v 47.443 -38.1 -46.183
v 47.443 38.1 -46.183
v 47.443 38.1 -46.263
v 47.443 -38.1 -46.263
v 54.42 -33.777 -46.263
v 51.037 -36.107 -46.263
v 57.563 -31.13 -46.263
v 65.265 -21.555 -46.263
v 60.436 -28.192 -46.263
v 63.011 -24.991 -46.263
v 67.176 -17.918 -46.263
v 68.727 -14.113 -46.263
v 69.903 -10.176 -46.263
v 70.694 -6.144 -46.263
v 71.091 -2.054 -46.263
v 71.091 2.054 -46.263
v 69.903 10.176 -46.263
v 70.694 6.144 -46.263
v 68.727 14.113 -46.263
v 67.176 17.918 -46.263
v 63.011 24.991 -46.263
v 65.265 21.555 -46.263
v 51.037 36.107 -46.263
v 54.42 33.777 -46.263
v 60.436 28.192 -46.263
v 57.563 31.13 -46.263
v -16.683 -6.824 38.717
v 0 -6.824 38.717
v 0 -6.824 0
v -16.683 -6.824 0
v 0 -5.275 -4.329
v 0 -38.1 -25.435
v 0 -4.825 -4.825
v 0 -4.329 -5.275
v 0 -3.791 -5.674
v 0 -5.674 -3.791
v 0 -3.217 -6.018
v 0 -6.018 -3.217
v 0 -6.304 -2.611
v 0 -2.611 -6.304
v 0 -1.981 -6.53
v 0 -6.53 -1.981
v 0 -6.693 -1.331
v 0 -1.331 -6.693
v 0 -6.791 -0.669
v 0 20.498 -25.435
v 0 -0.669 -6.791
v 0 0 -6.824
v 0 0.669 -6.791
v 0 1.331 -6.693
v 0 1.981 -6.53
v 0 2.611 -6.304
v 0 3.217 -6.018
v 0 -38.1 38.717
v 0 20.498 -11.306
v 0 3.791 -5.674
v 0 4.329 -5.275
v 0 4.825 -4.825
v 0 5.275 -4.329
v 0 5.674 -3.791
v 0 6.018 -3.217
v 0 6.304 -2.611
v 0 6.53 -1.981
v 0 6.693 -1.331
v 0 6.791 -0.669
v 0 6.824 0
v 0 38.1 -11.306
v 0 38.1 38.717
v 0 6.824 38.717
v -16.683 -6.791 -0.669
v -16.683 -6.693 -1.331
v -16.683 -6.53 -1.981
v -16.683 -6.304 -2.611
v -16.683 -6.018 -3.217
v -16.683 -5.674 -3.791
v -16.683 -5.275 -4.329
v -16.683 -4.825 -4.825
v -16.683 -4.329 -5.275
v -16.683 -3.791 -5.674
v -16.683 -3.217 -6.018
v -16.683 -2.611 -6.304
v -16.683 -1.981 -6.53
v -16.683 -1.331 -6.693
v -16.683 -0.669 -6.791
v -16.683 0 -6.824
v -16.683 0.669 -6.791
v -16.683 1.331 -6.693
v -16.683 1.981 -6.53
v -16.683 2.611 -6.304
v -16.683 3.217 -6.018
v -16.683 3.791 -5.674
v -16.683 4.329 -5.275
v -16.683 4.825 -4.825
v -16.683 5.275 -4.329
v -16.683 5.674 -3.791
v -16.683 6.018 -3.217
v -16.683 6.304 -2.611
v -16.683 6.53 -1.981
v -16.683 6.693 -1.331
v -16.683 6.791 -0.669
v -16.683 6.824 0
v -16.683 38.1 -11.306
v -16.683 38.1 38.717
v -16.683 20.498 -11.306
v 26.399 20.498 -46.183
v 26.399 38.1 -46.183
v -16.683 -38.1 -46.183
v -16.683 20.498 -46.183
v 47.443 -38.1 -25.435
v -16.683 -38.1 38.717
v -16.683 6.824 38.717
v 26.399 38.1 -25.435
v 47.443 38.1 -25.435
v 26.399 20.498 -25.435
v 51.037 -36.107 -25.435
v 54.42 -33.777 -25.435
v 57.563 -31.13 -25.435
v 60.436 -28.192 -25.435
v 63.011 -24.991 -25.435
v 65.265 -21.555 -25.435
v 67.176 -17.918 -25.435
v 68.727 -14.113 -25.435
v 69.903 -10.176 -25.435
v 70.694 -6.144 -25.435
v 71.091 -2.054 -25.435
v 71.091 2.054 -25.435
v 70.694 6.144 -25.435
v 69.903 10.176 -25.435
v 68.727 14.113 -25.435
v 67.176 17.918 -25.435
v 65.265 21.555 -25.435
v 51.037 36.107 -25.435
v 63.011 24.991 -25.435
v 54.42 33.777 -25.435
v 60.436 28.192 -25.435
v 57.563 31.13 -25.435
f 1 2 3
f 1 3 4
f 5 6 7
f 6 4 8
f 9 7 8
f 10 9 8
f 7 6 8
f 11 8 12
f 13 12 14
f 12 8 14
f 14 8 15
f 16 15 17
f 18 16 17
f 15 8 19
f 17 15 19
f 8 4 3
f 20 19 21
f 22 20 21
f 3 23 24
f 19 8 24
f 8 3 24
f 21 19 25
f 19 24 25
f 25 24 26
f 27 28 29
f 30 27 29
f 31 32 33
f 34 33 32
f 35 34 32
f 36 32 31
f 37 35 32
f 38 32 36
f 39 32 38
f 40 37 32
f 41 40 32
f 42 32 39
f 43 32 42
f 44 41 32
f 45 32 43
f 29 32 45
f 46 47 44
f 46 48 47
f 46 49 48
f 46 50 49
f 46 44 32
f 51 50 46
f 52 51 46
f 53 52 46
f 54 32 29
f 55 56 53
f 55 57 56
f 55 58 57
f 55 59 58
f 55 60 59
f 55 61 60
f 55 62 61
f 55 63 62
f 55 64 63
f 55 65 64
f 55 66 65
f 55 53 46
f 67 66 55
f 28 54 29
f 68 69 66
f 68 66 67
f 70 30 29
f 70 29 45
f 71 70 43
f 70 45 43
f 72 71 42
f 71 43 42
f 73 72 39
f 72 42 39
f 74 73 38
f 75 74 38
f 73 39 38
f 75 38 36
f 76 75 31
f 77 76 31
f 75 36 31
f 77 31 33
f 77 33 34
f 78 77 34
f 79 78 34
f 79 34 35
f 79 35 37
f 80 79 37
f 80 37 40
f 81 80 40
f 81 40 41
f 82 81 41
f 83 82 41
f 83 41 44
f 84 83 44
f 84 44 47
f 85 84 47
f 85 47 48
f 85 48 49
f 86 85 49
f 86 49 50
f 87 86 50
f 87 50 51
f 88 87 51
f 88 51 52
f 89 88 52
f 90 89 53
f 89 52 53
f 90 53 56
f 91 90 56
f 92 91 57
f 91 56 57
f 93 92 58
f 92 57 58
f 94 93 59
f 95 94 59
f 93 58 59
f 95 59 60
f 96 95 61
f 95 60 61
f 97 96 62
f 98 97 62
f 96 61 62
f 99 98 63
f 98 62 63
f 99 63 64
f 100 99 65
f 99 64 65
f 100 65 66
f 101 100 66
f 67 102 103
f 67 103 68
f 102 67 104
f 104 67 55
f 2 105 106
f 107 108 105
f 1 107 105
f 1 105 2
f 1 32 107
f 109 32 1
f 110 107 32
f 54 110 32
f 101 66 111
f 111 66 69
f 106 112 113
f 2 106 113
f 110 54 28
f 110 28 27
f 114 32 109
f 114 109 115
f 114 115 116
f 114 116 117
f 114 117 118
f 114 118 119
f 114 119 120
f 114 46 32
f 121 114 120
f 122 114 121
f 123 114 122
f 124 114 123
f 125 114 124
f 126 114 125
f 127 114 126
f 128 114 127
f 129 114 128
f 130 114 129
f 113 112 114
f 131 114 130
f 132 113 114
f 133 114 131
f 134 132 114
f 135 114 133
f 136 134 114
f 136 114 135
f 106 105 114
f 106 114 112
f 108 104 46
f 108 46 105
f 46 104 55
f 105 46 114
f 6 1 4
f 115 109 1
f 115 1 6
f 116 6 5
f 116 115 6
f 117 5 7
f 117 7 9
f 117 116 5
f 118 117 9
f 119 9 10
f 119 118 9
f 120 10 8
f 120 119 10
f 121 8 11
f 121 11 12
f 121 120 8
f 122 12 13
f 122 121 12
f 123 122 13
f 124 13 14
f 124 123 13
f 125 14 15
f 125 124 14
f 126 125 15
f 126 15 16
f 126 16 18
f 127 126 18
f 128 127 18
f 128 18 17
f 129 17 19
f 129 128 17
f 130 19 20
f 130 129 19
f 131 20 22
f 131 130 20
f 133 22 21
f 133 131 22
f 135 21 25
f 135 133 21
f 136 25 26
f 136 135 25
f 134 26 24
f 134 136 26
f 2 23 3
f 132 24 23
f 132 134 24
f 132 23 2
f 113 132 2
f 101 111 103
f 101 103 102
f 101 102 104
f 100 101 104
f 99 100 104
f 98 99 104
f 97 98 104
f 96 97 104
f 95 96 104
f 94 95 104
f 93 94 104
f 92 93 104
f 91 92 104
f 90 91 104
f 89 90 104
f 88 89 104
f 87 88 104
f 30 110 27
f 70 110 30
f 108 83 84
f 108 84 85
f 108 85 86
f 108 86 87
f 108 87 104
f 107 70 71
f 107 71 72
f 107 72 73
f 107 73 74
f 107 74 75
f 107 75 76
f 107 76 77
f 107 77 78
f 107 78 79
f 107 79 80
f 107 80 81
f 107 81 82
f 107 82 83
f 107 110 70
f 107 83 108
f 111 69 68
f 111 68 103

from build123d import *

# Parameters (mm, degrees)
F1_DEPTH = 38.1
F3_DEPTH = 20.828
F4_W     = 13.647594
F4_H     = 2.408188
F5_DEPTH = 50.8
F6_W     = 26.398936
F6_H     = 17.6022
F7_DEPTH = 50.8
F9_DEPTH = 50.8


with BuildPart() as f1:
    # F0 (on Front) → F1 (new body, symmetric)
    with BuildSketch(Plane.XZ):
        Polygon((0, 38.717061), (-16.683353, 38.717061), (-16.683353, -46.183128), (47.443293, -46.183128), (47.443293, -25.435435), (0, -25.435435), align=None)
    extrude(amount=F1_DEPTH, both=True)

    # F2 (on face) → F3 (join)
    with BuildSketch(Plane.XY.offset(-25.435435)):
        with BuildLine():
            Line((47.443293, 38.1), (47.443293, -38.1))
            ThreePointArc((47.443293, -38.1), (71.140257, 0), (47.443293, 38.1))
        make_face()
    extrude(amount=-F3_DEPTH)

    # F4 (on face) → F5 (cut)
    with BuildSketch(Plane.YZ):
        with BuildLine():
            ThreePointArc((-6.823797, 0), (0, 6.823797), (6.823797, 0))
            Line((6.823797, 0), (6.823797, 38.717061))
            Line((6.823797, 38.717061), (-6.823797, 38.717061))
            Line((-6.823797, 38.717061), (-6.823797, 0))
        make_face()
        with Locations((0, 39.921155)):
            Rectangle(F4_W, F4_H)
        with BuildLine():
            Line((-6.823797, 0), (6.823797, 0))
            ThreePointArc((6.823797, 0), (0, 6.823797), (-6.823797, 0))
        make_face()
        with BuildLine():
            ThreePointArc((-6.823797, 0), (0, -6.823797), (6.823797, 0))
            Line((6.823797, 0), (-6.823797, 0))
        make_face()
    extrude(amount=-F5_DEPTH, mode=Mode.SUBTRACT)

    # F6 (on face) → F7 (cut)
    with BuildSketch(Plane.XY.offset(-25.435435)):
        with Locations((13.199468, 29.2989)):
            Rectangle(F6_W, F6_H)
    extrude(amount=-F7_DEPTH, mode=Mode.SUBTRACT)

    # F8 (on face) → F9 (cut)
    with BuildSketch(Plane.YZ):
        Polygon((20.4978, -11.306379), (20.4978, -25.435435), (20.4978, -46.183128), (38.1, -46.183128), (38.1, -11.306379), align=None)
    extrude(amount=-F9_DEPTH, mode=Mode.SUBTRACT)


solid = f1.part
